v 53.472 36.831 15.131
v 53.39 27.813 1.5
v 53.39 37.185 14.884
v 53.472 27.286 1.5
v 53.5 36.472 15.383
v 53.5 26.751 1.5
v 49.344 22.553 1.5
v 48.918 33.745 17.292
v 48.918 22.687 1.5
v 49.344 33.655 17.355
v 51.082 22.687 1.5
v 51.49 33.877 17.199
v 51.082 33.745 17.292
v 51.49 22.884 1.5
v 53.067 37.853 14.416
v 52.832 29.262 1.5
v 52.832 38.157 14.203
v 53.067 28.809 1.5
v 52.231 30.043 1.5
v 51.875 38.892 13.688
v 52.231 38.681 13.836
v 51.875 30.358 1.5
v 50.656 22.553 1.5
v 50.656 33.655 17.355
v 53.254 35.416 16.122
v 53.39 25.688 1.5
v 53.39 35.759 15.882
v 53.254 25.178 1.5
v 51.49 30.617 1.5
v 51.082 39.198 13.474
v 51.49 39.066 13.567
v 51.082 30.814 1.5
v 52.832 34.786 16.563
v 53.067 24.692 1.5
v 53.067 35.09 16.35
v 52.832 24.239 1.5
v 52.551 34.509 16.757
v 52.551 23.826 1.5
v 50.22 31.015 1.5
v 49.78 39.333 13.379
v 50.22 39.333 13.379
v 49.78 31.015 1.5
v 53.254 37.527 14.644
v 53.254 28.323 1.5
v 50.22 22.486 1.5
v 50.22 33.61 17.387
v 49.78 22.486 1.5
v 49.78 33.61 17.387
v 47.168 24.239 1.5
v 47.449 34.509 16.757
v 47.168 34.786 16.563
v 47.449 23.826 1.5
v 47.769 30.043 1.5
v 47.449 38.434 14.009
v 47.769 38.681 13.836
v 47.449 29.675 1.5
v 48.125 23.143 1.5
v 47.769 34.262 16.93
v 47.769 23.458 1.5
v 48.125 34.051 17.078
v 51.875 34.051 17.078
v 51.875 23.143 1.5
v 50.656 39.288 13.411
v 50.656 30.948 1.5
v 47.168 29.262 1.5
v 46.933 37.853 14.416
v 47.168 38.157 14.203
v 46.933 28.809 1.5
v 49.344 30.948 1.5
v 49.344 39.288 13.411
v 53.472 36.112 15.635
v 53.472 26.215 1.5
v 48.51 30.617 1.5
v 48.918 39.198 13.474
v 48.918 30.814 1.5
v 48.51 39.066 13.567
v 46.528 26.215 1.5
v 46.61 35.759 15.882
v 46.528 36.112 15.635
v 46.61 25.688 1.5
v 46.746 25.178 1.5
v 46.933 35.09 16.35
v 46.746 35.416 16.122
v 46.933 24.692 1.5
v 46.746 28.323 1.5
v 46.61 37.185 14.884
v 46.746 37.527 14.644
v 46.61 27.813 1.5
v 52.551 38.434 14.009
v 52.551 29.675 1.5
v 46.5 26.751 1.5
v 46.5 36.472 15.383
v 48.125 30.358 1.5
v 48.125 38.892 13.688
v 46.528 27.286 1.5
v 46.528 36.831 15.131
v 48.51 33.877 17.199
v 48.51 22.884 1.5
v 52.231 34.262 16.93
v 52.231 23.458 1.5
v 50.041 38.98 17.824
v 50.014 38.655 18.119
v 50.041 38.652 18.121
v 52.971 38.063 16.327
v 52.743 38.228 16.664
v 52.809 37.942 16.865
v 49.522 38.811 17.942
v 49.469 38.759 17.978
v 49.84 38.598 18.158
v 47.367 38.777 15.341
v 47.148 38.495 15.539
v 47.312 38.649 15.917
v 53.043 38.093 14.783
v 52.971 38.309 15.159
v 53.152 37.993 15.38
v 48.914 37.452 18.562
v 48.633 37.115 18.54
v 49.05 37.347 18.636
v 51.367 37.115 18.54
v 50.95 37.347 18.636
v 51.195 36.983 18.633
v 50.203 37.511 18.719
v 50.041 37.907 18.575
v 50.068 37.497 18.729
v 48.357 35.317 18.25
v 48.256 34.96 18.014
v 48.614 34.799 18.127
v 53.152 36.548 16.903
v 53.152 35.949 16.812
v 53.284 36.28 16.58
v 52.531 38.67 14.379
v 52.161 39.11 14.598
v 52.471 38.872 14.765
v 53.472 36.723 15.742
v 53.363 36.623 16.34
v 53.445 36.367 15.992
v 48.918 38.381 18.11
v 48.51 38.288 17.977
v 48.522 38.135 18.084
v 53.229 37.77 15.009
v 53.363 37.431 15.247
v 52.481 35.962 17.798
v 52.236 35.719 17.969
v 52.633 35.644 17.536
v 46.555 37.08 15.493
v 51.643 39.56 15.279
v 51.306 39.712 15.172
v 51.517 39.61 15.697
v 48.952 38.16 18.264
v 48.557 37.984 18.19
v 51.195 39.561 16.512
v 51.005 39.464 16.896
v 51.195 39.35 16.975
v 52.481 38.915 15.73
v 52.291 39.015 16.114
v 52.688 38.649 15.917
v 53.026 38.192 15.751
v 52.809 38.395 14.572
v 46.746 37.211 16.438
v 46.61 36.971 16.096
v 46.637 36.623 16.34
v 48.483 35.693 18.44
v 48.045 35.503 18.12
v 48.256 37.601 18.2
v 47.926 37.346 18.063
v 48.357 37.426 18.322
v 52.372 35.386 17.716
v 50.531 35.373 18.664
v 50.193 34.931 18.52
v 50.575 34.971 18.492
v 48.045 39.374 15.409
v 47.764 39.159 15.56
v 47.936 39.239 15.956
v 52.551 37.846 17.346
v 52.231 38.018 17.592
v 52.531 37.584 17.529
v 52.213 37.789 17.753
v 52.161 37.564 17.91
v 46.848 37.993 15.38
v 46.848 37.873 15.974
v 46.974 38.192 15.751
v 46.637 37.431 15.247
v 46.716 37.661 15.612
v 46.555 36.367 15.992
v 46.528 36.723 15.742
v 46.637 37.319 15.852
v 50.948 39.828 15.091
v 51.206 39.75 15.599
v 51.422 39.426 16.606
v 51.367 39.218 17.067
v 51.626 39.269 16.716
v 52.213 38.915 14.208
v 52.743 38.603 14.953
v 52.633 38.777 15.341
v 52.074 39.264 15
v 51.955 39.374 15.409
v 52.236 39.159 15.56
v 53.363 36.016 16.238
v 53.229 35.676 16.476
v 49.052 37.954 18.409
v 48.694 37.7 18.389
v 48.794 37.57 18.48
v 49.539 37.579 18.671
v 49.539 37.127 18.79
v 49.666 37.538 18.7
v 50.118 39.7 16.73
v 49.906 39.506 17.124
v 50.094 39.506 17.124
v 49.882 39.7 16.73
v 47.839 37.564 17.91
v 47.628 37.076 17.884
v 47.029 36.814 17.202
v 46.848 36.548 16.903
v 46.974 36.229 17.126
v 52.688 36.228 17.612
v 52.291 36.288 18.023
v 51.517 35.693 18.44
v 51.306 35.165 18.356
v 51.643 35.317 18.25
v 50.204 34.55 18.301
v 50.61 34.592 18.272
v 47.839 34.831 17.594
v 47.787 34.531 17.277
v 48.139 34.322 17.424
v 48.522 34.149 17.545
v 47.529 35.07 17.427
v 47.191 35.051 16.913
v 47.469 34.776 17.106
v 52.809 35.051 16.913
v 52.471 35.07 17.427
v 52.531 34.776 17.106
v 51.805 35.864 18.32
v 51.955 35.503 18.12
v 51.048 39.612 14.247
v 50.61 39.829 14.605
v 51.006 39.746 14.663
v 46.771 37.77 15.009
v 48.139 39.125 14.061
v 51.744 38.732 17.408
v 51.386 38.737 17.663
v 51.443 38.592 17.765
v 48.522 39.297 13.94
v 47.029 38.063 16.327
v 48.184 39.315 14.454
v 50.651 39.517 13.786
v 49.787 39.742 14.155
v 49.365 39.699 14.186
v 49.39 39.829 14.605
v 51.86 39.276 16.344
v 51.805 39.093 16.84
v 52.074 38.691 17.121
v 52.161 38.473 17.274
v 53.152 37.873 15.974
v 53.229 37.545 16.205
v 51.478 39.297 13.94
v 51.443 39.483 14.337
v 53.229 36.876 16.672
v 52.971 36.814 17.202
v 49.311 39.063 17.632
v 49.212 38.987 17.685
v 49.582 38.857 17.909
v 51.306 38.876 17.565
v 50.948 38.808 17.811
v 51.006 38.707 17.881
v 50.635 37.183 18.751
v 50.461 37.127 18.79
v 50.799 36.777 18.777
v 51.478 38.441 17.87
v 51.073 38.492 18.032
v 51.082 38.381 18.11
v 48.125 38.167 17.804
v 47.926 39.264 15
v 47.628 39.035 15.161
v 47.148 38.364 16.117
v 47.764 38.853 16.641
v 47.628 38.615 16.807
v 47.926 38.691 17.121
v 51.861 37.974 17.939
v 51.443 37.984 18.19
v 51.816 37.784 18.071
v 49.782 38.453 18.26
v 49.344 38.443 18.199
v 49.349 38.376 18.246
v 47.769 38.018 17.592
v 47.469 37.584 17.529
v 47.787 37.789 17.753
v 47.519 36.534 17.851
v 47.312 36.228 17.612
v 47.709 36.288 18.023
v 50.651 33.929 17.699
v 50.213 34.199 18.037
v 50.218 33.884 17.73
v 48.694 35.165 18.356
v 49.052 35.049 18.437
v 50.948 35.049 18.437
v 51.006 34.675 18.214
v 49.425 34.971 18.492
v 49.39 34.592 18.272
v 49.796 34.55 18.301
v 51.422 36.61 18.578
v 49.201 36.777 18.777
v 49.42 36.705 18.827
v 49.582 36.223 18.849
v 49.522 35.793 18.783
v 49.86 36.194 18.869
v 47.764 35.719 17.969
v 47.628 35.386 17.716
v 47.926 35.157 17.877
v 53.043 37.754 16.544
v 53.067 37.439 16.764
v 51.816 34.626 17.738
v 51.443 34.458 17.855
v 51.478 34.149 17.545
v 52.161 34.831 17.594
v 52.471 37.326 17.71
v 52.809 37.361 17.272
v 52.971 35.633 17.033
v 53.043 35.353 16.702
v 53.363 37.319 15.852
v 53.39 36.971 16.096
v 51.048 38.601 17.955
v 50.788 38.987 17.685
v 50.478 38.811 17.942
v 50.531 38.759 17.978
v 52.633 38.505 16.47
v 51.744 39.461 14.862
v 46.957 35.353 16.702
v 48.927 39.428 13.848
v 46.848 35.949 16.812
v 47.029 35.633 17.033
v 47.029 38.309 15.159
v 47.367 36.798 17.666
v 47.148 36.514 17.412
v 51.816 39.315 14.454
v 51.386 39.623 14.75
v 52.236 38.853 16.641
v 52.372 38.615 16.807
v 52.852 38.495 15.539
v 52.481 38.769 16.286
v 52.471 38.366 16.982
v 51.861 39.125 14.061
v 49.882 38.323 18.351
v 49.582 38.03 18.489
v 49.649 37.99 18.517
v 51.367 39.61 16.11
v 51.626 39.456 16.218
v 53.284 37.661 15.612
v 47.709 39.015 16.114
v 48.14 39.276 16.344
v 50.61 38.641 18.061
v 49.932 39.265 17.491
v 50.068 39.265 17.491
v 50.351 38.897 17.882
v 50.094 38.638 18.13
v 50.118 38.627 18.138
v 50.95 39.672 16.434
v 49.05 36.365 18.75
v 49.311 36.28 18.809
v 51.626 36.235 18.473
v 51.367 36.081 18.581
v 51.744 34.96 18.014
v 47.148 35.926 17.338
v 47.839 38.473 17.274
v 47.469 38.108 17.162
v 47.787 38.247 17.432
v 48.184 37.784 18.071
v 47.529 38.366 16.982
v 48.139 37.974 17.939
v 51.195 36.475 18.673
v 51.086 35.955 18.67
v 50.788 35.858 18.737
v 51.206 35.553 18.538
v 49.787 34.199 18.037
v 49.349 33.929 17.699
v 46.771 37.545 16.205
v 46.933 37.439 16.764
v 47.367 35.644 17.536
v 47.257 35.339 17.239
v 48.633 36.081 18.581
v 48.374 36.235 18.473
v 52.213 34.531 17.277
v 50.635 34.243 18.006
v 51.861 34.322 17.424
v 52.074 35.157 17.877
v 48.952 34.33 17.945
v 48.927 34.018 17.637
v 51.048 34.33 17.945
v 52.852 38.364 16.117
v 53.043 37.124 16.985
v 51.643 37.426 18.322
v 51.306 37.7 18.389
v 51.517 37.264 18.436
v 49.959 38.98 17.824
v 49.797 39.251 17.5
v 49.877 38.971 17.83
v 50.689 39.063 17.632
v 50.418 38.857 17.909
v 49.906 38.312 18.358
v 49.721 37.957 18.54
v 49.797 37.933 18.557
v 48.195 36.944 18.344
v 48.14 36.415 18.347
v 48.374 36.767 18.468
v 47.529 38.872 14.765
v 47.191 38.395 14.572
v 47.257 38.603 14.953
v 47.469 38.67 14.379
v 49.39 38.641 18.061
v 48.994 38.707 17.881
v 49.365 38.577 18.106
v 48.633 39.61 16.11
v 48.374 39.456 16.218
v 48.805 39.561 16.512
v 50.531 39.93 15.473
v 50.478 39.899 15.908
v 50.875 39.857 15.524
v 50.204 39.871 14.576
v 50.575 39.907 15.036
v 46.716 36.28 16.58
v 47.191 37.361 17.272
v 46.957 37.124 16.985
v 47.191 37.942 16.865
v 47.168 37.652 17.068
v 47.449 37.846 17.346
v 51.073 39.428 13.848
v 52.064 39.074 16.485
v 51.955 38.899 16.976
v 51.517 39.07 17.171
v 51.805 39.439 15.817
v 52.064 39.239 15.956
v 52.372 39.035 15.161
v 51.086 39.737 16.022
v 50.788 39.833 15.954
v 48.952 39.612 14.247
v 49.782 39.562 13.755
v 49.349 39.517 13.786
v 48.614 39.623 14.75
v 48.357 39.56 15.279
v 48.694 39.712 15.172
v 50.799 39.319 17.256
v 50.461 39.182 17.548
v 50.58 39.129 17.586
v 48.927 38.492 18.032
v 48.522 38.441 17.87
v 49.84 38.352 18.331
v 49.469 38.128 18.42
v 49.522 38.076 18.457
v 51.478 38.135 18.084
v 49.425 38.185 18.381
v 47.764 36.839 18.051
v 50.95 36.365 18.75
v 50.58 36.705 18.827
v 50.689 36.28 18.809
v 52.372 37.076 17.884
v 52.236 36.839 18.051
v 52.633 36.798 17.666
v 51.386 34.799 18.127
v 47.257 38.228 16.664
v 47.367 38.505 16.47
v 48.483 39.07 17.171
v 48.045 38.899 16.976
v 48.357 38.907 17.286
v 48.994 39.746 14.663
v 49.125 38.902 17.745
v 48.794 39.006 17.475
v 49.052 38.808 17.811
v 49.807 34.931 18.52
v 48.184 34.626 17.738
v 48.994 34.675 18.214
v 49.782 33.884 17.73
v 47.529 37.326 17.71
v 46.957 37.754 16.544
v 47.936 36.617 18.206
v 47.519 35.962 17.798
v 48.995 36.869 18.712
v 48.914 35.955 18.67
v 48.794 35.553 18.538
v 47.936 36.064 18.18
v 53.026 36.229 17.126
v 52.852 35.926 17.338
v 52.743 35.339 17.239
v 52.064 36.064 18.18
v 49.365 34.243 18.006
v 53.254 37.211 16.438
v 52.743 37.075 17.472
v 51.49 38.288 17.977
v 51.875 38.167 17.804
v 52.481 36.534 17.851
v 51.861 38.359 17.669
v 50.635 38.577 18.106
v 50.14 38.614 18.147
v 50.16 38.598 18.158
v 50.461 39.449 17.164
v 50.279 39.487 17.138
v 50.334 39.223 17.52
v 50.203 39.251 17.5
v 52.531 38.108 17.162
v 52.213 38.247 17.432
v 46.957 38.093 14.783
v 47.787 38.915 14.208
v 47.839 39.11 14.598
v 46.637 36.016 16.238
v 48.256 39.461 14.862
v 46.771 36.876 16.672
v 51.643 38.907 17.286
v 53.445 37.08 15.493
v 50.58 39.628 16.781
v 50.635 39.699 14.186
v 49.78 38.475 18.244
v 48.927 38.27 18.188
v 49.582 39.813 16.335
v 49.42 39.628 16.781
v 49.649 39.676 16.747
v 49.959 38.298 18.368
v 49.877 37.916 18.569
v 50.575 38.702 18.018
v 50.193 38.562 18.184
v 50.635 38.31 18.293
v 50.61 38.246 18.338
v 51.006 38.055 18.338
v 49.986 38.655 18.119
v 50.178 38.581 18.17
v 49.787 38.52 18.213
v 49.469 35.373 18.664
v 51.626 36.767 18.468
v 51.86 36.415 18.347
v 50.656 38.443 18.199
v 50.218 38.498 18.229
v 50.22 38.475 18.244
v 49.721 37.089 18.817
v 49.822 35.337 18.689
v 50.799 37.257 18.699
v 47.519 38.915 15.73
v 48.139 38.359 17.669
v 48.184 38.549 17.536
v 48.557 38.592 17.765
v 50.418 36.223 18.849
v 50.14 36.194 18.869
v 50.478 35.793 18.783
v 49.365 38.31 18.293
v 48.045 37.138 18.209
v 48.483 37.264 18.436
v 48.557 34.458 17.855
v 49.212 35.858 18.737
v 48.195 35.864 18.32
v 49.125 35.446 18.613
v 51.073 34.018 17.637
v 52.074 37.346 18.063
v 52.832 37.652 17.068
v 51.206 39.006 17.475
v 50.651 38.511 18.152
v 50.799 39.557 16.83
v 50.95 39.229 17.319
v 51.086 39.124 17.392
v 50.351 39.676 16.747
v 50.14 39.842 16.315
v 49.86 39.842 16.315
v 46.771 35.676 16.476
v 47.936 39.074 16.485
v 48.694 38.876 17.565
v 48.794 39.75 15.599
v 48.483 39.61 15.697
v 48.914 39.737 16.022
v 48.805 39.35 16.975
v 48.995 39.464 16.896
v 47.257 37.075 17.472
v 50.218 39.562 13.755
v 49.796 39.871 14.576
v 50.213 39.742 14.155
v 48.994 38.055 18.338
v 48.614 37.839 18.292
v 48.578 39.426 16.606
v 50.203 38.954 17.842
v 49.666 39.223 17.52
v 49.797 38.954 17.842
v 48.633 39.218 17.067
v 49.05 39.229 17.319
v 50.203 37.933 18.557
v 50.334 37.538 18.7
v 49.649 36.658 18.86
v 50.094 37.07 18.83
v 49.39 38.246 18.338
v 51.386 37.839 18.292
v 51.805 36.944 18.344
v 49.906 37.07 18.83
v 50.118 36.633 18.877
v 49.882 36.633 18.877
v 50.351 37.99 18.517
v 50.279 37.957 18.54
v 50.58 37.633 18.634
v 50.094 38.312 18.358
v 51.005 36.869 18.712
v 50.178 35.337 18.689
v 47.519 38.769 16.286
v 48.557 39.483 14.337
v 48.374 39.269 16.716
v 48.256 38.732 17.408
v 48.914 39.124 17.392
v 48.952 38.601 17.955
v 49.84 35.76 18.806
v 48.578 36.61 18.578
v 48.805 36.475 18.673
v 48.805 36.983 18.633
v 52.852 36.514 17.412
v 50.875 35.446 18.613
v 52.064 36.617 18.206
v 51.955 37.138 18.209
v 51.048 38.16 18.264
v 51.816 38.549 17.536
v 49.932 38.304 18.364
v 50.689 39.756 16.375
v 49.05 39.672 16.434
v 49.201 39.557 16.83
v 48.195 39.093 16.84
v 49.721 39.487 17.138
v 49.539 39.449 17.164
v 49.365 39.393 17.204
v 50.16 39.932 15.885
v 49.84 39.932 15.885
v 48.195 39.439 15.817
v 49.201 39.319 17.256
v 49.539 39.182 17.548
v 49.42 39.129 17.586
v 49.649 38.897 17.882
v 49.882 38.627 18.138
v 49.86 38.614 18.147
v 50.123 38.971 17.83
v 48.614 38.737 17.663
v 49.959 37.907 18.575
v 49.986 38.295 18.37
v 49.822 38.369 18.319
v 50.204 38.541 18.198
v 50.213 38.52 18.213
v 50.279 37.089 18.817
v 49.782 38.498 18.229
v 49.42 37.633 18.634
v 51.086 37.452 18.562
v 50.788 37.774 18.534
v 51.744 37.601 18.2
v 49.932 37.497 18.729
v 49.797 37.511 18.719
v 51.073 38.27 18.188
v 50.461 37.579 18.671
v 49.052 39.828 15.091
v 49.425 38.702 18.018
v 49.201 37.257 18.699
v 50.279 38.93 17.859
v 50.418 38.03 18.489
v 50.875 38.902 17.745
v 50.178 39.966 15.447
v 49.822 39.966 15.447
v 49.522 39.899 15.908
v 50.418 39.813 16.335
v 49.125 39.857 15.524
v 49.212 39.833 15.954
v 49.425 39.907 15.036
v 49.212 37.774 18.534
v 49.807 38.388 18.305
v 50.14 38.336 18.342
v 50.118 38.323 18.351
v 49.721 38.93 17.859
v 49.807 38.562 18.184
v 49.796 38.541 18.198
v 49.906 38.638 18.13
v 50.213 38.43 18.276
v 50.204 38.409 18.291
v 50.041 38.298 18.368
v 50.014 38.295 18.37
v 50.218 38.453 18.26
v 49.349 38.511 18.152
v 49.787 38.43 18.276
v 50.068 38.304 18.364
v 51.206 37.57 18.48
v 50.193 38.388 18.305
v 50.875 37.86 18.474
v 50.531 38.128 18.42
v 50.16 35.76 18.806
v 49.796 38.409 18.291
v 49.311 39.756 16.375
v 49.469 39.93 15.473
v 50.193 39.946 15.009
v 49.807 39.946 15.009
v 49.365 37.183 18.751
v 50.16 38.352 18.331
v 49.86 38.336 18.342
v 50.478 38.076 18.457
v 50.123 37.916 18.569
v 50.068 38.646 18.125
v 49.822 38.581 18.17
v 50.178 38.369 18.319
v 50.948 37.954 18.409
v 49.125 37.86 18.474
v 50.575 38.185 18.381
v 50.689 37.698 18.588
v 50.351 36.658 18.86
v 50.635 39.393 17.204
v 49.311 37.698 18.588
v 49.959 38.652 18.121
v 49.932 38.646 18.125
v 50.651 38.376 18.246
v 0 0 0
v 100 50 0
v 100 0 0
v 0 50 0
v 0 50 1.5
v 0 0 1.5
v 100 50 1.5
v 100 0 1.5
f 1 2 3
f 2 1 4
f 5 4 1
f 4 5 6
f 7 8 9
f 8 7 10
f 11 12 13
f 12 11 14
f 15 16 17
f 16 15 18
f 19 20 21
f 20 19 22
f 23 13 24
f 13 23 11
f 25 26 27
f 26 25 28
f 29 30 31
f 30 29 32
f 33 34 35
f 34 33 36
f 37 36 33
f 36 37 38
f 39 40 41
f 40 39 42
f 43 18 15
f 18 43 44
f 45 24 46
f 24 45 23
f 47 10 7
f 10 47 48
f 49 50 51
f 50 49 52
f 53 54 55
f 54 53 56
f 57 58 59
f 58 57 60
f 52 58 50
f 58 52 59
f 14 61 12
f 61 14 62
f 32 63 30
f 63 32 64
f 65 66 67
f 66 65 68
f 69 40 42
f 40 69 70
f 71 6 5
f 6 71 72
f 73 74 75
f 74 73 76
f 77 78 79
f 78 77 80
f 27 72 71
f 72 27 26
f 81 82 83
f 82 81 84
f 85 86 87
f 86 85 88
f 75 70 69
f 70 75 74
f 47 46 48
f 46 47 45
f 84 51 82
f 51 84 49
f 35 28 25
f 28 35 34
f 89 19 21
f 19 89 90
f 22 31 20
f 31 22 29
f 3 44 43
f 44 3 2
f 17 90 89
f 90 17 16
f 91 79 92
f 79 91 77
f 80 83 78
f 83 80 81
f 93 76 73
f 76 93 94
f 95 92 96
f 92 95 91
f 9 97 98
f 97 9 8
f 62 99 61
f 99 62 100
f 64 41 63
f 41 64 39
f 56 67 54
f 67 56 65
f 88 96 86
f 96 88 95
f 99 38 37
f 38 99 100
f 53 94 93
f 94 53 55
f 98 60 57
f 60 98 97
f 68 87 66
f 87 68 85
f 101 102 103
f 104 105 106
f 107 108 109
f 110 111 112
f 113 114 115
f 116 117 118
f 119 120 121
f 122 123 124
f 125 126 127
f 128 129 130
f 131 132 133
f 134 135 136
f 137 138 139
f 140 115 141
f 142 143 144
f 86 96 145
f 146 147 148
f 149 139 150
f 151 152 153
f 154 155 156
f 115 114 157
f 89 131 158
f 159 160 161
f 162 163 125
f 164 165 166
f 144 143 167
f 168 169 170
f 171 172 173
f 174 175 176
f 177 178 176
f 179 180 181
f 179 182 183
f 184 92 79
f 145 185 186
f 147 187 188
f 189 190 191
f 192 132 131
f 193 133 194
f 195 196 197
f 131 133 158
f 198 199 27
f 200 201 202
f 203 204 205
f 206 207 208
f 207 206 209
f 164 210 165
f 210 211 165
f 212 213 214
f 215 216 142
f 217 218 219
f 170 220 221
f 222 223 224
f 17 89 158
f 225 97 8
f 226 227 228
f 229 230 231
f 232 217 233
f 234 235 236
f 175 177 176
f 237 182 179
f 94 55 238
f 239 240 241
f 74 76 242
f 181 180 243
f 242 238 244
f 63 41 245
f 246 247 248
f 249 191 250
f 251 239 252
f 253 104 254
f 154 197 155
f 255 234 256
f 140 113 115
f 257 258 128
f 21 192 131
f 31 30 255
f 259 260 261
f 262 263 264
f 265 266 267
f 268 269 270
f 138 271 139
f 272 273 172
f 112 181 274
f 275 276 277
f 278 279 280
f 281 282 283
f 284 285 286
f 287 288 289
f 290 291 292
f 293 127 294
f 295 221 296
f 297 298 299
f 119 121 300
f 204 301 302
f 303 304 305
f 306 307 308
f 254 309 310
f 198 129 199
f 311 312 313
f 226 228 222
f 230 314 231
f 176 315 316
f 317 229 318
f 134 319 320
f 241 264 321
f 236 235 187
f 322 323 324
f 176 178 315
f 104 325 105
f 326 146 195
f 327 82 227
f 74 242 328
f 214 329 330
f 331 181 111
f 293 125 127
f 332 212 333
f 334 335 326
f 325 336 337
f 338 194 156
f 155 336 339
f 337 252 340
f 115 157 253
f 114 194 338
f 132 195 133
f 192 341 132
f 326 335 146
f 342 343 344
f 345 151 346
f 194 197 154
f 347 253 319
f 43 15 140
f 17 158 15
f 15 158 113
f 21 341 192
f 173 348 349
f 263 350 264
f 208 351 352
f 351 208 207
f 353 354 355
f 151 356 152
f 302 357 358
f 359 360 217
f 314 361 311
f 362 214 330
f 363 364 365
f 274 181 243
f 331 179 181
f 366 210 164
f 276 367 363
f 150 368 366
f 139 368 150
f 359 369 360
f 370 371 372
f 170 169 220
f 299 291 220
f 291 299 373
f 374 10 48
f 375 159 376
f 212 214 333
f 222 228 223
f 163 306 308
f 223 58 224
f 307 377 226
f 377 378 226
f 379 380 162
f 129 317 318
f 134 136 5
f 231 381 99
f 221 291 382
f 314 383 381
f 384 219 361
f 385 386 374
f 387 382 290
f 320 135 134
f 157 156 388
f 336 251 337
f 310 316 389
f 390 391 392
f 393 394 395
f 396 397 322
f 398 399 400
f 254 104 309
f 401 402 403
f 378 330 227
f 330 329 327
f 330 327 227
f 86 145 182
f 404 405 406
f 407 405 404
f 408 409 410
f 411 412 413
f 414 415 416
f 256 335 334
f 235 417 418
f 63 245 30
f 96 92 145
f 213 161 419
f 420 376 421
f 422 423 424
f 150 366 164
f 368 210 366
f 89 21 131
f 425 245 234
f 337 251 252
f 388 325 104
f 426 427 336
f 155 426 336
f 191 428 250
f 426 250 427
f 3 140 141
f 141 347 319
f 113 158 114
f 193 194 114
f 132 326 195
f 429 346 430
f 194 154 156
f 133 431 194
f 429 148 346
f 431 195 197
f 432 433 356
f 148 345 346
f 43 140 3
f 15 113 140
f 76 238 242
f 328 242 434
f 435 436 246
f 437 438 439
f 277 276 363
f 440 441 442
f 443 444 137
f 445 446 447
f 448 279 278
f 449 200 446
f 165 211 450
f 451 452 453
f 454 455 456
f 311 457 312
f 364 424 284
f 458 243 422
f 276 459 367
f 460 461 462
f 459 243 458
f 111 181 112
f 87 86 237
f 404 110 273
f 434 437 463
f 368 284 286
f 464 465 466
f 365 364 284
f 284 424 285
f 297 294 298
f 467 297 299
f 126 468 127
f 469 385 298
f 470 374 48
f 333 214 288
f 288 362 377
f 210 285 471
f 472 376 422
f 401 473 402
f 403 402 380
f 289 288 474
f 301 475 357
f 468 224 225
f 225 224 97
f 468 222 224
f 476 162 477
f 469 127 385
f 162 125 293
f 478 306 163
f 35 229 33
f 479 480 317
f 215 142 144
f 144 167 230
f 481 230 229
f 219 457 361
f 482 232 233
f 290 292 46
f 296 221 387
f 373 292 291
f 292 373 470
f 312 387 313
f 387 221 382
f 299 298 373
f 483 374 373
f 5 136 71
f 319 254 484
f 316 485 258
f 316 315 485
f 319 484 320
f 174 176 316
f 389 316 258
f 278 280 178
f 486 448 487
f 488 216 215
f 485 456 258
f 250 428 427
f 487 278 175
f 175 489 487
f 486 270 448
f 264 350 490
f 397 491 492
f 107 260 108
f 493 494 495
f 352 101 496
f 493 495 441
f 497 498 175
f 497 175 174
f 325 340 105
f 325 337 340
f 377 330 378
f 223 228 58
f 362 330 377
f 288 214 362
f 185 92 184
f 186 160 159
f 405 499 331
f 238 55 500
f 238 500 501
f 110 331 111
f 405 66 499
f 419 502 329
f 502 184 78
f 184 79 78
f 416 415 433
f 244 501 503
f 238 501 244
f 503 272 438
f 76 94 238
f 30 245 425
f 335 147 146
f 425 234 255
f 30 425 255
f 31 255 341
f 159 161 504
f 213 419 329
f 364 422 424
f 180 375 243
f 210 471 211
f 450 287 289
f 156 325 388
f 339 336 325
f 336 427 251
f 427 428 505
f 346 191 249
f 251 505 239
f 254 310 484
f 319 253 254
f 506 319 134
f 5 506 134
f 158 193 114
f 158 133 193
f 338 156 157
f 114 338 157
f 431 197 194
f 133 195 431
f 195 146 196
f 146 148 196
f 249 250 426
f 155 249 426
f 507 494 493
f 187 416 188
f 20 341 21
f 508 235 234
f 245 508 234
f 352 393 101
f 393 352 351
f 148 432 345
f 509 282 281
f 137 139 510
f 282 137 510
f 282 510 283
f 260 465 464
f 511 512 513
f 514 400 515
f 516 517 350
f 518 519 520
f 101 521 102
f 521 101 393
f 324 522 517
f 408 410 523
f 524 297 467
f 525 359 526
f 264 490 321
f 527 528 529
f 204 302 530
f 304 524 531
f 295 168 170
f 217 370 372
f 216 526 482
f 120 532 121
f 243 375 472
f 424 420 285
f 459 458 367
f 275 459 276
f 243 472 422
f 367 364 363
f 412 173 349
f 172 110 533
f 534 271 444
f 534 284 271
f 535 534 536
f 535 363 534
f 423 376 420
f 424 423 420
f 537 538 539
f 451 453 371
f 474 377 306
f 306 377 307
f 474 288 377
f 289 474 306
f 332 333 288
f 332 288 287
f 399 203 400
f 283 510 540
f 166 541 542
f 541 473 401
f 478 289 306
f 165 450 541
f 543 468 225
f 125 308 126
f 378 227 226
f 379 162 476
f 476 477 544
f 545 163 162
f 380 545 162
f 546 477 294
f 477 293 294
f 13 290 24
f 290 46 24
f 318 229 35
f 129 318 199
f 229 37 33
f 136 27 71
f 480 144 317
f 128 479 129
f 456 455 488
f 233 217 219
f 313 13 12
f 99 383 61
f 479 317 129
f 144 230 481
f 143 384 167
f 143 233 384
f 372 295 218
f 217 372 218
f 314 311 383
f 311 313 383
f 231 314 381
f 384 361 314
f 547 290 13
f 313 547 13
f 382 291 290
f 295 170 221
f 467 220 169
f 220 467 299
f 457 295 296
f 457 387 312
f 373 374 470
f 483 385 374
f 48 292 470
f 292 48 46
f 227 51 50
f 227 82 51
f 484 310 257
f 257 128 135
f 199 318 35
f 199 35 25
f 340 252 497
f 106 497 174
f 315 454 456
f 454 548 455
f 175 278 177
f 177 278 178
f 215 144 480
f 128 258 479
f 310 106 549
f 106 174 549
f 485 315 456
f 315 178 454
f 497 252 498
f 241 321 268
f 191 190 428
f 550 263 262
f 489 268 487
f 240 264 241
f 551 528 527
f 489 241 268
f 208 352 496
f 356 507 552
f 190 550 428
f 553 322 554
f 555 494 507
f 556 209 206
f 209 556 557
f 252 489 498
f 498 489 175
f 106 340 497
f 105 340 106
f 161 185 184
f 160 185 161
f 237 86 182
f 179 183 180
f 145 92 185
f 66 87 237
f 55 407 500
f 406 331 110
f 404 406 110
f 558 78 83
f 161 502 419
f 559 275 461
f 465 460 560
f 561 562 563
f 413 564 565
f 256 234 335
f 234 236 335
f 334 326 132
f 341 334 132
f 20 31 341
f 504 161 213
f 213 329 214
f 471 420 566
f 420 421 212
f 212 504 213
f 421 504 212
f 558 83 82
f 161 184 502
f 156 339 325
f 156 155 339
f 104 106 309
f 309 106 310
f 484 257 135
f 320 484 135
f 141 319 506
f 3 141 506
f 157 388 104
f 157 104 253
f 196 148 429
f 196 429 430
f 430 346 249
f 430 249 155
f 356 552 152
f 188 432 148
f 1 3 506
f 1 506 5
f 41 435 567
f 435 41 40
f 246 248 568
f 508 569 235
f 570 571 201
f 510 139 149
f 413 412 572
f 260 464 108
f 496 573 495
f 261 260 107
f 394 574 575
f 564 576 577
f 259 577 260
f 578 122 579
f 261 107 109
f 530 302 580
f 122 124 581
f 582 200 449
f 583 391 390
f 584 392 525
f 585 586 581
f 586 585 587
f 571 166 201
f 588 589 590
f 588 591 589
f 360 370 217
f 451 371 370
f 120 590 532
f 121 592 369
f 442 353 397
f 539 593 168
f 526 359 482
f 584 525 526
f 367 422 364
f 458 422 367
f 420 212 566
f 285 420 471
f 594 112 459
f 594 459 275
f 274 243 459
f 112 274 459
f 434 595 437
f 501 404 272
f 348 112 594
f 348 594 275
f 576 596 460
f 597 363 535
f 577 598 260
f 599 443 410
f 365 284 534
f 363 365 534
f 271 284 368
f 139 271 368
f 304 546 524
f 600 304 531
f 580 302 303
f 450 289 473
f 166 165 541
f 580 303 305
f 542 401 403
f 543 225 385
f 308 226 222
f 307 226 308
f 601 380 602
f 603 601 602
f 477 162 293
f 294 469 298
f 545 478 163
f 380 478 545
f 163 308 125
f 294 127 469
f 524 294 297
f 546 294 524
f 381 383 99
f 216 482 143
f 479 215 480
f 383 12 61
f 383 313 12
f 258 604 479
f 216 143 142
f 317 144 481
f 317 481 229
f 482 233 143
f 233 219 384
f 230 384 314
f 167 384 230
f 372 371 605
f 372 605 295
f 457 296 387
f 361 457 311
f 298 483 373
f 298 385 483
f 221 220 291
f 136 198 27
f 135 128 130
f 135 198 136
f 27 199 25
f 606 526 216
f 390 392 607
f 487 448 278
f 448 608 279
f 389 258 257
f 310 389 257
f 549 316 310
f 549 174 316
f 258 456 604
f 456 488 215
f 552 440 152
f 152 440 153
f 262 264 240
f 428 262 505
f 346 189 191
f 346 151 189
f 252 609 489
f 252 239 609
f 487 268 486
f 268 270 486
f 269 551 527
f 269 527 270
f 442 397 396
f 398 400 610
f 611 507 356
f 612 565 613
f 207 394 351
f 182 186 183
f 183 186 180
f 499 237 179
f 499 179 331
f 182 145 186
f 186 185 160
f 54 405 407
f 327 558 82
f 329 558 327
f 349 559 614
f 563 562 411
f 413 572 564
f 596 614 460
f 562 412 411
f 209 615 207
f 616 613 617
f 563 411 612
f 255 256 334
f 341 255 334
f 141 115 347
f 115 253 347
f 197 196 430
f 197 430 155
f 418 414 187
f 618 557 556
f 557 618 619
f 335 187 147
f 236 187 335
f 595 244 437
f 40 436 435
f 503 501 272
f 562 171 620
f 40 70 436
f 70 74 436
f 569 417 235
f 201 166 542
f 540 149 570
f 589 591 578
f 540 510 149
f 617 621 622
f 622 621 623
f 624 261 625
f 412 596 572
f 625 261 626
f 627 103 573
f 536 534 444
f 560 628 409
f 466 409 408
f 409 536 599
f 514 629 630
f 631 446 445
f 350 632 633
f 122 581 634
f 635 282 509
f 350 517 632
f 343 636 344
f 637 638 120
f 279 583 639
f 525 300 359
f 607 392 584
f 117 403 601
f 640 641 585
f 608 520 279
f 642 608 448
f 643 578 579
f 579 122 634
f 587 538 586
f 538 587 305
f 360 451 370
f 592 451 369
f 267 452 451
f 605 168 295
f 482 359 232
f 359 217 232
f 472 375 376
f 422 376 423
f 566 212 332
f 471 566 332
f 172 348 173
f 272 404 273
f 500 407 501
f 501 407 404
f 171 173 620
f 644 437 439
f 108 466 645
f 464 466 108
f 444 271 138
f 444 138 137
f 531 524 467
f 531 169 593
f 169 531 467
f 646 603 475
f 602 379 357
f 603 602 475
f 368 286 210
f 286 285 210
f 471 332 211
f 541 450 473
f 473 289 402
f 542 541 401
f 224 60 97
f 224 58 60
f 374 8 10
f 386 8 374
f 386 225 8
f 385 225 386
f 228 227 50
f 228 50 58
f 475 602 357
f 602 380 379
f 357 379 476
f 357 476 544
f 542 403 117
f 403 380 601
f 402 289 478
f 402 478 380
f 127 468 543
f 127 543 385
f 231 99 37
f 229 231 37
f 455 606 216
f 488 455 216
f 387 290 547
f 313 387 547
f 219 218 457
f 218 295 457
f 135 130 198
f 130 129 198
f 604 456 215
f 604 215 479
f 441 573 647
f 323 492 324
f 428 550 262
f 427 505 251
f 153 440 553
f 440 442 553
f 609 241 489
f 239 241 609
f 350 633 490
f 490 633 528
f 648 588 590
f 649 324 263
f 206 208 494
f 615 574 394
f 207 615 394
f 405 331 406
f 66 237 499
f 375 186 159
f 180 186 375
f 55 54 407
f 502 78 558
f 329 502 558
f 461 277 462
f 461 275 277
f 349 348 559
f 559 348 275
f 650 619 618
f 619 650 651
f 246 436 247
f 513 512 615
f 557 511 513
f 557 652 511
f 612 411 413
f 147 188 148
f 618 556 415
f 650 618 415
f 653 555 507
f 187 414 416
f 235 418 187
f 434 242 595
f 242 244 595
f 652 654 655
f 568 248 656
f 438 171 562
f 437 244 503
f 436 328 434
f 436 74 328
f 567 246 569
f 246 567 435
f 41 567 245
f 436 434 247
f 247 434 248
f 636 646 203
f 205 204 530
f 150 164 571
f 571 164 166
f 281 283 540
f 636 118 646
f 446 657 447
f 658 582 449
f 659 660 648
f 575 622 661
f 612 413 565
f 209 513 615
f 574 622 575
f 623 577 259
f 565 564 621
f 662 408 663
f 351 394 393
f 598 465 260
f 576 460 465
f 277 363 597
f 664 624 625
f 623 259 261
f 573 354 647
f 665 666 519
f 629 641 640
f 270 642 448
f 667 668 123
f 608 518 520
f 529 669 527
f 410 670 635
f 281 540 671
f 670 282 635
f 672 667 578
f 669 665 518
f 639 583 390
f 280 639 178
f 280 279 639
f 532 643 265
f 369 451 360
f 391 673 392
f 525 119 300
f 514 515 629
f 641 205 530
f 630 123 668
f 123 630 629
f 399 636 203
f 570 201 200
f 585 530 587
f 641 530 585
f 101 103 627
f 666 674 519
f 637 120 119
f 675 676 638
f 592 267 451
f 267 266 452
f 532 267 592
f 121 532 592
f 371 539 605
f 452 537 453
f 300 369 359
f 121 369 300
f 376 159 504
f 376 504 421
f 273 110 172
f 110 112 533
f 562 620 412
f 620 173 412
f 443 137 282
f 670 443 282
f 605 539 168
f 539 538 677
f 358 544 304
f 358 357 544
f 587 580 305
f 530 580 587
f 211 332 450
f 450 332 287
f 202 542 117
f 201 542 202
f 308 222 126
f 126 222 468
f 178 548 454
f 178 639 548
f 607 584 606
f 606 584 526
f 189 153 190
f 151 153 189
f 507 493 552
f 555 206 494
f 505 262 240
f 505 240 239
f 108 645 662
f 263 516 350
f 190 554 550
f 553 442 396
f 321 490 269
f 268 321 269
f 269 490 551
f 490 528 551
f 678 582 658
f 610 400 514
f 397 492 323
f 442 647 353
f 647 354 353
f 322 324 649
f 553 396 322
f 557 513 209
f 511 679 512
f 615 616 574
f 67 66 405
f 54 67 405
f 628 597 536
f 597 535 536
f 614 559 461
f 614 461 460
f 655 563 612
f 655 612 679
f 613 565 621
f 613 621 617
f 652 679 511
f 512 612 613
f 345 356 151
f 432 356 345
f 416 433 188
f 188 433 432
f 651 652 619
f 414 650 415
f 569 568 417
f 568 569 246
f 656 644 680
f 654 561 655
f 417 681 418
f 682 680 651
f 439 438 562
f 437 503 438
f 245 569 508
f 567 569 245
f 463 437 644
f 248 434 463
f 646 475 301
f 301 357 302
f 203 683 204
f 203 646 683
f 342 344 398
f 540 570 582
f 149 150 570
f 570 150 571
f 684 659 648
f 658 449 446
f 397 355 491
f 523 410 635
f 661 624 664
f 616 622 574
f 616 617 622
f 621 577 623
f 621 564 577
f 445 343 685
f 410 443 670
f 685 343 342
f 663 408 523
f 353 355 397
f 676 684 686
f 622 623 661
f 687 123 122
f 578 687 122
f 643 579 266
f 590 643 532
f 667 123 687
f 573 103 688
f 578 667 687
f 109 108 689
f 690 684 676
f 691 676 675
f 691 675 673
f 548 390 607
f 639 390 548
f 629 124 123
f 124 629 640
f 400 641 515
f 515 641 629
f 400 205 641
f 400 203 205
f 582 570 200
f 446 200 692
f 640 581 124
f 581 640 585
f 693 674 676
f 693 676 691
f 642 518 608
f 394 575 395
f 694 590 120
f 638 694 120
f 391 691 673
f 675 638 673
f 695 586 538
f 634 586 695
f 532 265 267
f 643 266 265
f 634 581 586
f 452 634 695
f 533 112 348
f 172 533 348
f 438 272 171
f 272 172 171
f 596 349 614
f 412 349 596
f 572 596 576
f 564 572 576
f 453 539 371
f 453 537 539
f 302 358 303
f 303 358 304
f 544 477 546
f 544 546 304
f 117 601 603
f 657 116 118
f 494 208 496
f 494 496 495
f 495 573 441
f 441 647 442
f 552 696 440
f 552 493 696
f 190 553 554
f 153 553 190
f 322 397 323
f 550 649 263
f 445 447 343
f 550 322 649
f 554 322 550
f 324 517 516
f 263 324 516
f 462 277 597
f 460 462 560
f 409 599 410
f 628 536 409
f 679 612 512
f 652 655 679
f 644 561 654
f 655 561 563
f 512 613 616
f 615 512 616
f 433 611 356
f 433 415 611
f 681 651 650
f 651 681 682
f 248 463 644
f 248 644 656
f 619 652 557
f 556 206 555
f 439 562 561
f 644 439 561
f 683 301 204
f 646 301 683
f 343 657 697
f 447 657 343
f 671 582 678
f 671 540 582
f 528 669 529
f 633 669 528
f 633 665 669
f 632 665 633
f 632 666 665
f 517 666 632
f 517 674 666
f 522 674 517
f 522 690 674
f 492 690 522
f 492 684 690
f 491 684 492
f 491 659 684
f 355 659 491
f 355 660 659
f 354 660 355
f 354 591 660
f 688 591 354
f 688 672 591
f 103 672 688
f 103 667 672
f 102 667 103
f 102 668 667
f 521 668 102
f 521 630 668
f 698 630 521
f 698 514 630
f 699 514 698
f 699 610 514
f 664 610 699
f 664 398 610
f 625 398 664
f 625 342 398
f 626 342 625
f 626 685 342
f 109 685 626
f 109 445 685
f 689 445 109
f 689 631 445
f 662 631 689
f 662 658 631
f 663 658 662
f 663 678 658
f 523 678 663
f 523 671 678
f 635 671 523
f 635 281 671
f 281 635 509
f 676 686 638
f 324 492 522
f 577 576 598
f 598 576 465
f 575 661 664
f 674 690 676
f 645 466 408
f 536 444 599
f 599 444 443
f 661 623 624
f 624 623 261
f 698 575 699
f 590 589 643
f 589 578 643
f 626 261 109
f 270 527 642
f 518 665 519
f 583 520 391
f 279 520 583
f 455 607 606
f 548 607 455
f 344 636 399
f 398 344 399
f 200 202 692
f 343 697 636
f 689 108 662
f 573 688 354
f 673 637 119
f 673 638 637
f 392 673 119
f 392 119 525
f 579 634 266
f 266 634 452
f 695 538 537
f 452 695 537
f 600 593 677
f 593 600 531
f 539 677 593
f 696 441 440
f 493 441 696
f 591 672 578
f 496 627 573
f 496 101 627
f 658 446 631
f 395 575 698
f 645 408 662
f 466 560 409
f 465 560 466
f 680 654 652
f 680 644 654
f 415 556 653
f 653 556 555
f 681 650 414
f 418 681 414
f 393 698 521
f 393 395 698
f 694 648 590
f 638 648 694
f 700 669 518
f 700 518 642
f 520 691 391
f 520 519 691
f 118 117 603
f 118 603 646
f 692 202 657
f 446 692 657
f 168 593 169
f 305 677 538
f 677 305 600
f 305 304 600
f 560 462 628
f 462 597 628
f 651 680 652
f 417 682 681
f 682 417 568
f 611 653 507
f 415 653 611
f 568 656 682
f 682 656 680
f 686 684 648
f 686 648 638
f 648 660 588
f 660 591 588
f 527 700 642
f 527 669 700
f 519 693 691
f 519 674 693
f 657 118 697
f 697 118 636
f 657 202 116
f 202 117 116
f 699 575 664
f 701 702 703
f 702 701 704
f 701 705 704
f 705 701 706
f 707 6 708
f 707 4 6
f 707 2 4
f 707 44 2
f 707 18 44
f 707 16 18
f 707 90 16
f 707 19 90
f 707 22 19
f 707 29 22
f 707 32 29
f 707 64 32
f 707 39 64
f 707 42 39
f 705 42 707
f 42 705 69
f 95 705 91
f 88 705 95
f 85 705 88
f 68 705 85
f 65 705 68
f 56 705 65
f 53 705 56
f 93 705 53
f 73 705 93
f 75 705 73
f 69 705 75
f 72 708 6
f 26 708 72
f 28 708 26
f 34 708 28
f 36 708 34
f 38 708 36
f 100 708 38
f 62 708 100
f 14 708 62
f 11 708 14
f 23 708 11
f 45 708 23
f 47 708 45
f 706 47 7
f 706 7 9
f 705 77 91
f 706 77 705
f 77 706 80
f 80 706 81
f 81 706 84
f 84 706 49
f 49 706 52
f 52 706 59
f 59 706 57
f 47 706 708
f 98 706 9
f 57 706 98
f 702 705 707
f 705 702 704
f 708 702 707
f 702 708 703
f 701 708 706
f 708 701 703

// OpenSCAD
$fn=50;
eps=.1;

difference() {
    union() {
        linear_extrude(1.5) square([100,50]);

        translate([50,25,-1]) rotate([-35,0,0]) {
            cylinder(h=20,r=3.5);
            translate([0,0,20]) sphere(3.5);
        }
    }

    translate([0,0,-5]) linear_extrude(5) square([100,50]);
}
